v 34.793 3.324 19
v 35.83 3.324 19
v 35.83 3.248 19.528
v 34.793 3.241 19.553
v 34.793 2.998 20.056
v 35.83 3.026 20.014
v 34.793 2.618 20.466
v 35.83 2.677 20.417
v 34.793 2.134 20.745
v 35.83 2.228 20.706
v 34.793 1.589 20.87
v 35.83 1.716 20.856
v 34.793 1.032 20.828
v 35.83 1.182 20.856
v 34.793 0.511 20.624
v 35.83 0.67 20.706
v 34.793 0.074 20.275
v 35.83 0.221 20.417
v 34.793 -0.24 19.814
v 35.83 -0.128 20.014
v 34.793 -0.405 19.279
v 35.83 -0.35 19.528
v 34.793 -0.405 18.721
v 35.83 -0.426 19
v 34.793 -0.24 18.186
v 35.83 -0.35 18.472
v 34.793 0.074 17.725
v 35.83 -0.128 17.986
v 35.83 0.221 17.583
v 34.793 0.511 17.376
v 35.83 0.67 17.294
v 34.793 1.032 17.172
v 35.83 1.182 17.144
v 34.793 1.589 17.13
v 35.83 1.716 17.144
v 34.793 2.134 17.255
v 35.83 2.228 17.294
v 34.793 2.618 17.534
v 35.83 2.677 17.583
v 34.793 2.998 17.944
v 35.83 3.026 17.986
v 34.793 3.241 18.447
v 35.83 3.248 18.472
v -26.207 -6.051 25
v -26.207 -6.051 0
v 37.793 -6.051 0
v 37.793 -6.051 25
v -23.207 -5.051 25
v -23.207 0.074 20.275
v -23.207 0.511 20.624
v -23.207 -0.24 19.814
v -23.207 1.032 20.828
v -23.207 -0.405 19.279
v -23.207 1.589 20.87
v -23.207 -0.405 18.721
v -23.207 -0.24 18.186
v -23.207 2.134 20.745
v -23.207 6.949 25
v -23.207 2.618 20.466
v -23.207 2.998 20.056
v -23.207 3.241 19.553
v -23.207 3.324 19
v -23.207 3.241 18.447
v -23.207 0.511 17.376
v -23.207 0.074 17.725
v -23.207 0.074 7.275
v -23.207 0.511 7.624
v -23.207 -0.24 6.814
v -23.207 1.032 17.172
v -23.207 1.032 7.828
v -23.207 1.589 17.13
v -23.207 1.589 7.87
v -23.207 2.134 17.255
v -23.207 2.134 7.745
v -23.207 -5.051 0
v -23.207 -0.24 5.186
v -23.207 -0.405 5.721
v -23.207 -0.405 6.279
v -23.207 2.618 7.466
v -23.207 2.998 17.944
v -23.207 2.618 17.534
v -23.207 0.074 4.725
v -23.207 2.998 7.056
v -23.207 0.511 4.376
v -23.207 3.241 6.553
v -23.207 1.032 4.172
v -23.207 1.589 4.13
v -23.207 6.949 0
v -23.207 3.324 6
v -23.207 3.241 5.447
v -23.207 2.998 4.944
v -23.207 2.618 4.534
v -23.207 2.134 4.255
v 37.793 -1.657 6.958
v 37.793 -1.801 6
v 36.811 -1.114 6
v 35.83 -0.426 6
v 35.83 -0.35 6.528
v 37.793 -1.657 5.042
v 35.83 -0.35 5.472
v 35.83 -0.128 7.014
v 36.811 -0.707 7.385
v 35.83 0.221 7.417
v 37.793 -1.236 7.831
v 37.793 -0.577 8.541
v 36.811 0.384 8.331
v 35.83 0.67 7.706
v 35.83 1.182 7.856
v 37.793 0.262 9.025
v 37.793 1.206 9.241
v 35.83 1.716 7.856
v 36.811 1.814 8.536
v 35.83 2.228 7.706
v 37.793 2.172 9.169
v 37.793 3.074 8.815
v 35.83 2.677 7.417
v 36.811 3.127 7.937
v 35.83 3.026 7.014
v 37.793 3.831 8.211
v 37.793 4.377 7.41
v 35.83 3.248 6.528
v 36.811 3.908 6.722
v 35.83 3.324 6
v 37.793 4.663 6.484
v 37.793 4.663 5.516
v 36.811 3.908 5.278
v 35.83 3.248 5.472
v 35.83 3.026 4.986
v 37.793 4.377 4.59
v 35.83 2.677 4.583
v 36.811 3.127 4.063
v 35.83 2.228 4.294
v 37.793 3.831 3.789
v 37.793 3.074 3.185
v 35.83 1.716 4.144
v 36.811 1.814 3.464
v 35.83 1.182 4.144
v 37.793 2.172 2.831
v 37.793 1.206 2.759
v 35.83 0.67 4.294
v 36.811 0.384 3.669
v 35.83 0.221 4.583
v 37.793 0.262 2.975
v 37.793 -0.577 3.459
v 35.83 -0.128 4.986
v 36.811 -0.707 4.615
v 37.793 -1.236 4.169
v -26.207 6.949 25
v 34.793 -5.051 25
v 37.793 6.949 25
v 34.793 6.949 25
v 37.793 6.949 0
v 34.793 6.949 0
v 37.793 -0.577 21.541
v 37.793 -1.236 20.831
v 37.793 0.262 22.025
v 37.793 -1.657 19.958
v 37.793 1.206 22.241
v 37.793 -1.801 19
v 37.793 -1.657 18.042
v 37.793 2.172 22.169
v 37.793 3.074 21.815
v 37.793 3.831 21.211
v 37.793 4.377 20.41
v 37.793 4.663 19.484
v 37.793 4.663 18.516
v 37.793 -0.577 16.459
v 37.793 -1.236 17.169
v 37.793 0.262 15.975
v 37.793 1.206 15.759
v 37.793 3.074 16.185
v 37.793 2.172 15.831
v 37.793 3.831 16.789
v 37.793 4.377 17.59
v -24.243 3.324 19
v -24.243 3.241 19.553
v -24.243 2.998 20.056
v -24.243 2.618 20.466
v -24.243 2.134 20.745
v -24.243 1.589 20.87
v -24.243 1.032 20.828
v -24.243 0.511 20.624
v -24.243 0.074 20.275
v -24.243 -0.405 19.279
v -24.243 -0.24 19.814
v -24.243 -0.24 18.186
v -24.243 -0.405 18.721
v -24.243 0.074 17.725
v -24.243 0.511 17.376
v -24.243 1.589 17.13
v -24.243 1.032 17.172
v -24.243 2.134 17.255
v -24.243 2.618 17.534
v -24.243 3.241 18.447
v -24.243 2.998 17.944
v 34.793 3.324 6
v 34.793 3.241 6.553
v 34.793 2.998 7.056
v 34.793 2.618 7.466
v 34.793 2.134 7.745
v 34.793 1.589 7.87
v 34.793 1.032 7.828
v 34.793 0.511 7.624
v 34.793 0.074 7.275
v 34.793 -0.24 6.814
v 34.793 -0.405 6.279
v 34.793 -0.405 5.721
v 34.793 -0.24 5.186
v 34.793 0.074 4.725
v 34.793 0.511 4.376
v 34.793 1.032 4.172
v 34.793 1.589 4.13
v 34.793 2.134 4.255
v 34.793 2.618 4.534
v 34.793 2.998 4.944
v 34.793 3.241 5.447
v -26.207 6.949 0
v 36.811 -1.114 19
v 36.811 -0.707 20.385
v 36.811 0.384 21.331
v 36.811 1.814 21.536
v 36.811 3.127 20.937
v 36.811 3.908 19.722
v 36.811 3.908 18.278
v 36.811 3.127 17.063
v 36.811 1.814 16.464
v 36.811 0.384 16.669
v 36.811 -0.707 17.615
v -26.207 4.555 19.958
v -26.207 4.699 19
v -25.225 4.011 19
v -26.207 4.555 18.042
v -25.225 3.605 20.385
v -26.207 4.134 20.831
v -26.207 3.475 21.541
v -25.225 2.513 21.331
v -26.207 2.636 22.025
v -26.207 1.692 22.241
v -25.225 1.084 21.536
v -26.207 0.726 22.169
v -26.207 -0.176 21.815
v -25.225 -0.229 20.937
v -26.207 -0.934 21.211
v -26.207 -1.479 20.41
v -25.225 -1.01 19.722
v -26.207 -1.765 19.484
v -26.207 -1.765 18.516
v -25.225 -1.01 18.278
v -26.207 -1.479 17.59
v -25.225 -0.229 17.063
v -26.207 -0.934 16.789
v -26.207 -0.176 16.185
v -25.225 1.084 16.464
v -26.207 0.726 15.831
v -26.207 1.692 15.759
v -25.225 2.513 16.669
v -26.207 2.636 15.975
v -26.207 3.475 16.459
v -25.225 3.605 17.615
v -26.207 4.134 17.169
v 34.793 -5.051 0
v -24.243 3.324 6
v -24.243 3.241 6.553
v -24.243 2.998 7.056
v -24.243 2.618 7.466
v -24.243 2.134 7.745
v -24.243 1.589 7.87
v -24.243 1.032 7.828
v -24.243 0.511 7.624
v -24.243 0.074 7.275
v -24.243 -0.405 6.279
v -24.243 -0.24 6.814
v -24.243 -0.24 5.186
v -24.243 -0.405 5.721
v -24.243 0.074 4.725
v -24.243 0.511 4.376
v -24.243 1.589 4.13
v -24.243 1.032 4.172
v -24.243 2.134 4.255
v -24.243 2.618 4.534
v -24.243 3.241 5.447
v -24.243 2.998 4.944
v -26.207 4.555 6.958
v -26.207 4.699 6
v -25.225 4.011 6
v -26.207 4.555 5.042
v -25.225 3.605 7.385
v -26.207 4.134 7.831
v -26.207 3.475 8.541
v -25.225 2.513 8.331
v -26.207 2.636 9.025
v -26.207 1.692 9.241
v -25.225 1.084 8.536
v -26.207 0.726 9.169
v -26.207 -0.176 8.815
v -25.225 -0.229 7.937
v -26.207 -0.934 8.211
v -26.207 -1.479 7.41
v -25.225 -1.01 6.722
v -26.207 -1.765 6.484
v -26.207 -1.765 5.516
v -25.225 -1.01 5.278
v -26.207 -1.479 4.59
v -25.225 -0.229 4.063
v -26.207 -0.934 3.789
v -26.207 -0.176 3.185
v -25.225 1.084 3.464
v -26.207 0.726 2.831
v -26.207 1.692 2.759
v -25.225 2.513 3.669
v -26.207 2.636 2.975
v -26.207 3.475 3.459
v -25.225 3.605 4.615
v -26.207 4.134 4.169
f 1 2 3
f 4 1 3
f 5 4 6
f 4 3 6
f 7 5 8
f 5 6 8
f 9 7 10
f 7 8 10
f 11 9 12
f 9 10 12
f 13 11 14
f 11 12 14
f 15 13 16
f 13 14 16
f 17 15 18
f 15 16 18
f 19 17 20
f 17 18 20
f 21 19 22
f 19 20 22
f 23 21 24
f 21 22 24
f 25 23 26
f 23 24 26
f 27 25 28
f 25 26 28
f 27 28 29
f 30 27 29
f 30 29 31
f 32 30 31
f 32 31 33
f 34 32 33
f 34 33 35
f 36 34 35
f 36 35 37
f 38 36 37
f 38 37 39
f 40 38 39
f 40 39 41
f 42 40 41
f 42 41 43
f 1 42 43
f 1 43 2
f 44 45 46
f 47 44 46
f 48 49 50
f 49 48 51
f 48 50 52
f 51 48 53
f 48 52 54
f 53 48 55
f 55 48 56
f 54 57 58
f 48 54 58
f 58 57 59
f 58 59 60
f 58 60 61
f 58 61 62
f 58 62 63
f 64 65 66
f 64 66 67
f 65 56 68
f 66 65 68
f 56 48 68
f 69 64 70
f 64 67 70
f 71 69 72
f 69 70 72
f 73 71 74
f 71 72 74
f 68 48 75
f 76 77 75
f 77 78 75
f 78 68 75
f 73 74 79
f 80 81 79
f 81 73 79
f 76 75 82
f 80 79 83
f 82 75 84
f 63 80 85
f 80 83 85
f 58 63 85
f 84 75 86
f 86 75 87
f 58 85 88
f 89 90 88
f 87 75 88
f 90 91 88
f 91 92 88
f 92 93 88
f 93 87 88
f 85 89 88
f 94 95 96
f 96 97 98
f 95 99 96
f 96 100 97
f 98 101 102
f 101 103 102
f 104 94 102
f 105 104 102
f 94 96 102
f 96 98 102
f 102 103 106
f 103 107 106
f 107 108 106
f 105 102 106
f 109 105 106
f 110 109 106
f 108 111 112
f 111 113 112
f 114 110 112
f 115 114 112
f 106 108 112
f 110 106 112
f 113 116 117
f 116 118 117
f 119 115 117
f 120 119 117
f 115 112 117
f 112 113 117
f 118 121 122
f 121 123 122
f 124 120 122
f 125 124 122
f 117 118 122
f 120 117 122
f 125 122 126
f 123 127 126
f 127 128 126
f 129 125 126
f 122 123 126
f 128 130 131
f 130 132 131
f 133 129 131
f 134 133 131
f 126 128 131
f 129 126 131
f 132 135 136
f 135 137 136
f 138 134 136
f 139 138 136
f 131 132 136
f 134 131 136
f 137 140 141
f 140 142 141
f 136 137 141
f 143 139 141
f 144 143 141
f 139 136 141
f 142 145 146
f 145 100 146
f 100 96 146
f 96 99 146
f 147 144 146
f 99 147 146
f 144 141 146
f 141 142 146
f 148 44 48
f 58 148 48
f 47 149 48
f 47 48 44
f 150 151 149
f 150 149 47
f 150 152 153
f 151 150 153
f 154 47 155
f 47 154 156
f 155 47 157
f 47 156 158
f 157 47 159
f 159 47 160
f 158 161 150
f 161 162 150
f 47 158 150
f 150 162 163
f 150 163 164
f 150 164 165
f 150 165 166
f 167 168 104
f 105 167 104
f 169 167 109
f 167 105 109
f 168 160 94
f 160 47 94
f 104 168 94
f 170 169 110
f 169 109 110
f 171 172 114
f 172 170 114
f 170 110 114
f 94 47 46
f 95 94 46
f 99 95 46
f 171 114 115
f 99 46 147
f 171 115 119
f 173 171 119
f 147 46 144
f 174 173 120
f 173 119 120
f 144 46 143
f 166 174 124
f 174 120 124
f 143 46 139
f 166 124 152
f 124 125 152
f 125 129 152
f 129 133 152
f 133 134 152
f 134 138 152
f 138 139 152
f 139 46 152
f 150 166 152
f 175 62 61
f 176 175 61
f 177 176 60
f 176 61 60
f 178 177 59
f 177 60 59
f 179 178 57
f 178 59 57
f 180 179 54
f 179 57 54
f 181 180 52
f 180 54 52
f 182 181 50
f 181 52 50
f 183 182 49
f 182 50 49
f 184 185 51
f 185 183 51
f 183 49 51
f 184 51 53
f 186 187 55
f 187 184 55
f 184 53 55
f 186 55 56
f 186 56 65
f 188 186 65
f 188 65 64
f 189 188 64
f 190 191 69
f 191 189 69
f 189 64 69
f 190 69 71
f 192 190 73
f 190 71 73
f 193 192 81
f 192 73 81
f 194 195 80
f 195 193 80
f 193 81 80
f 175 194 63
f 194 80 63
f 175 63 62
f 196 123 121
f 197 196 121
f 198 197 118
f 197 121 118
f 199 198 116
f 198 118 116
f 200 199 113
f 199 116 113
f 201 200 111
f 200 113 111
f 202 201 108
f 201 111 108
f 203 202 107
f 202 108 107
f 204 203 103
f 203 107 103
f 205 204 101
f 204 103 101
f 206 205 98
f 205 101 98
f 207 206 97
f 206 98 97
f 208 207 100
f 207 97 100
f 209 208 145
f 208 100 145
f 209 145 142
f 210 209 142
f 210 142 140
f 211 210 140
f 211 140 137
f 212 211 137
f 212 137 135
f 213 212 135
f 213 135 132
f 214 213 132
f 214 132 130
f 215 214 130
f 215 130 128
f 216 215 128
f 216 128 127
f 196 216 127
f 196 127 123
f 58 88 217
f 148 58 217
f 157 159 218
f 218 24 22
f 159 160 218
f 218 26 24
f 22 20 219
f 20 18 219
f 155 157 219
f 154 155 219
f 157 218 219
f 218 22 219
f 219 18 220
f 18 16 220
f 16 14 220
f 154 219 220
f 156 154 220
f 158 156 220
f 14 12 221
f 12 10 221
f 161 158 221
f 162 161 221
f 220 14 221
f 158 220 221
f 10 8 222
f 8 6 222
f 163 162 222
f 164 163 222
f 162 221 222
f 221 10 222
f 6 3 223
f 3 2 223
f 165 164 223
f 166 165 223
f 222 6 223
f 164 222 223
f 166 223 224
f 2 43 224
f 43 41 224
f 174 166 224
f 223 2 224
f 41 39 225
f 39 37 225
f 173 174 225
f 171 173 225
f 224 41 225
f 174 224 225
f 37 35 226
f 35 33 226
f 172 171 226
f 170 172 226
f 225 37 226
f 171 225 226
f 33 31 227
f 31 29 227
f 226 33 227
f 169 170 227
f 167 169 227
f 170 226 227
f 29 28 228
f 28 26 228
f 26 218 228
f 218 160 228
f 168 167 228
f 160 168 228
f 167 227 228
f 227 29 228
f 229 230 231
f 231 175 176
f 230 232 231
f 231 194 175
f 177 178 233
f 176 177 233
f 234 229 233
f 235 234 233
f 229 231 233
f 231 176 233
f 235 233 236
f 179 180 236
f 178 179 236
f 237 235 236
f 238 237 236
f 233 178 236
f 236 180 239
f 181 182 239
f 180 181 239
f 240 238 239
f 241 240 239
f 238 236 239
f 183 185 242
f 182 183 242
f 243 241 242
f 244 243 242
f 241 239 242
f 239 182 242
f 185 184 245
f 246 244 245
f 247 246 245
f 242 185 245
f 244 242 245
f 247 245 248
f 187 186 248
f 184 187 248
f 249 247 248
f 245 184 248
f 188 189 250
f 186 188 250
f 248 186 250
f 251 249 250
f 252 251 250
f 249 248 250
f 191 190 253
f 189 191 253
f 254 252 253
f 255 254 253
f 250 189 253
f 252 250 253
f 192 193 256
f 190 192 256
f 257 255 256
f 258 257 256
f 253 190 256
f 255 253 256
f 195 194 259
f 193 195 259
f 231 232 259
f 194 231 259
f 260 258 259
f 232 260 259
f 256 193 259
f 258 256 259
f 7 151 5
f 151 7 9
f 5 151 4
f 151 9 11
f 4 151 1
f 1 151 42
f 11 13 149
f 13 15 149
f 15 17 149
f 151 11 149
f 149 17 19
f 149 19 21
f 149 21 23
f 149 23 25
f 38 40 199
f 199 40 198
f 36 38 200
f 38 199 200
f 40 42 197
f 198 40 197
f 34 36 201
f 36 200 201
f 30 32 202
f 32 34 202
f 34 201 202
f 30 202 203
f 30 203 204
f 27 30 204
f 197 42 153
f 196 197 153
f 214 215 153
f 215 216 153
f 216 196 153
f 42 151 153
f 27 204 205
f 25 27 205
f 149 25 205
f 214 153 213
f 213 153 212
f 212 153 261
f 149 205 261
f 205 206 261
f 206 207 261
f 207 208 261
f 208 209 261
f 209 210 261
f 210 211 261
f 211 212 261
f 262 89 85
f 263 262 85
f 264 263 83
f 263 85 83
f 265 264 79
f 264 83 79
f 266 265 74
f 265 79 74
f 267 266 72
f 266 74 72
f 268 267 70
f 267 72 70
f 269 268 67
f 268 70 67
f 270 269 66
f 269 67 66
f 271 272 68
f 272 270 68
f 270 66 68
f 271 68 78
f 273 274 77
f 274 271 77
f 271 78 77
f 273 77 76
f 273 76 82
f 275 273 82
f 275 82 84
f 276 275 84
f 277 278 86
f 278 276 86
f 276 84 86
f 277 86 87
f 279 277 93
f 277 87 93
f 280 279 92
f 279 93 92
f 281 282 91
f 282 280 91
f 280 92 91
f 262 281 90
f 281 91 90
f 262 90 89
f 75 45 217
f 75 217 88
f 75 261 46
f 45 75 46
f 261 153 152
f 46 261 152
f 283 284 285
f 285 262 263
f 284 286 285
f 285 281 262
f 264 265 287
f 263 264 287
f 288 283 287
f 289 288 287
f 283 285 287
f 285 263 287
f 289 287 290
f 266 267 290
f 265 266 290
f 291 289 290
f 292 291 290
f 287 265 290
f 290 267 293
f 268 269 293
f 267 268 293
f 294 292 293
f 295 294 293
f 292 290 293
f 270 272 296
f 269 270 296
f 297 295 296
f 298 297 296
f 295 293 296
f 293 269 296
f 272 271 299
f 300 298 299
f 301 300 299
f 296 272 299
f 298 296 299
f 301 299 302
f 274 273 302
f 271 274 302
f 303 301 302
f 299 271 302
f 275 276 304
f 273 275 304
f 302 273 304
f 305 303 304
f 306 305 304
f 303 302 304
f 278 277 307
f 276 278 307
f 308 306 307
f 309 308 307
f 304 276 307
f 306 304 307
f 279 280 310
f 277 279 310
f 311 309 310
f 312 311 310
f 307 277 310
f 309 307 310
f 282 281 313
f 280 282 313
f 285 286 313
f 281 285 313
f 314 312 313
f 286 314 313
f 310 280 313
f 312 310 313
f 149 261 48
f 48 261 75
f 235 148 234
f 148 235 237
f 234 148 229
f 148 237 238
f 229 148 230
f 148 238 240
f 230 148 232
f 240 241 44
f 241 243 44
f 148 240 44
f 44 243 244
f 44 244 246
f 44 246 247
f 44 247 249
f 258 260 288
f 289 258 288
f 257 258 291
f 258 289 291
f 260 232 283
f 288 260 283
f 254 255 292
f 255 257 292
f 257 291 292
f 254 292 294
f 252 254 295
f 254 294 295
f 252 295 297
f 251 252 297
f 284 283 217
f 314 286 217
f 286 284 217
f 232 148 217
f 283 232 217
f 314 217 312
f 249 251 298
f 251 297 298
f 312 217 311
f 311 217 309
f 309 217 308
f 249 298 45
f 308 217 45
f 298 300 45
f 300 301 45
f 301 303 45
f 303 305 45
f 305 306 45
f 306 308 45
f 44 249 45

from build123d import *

# Parameters (mm, degrees)
F1_DEPTH       = 25
F4_D           = 3.75
F4_CSINK_D     = 6.5
F4_CSINK_ANGLE = 70
F5_D           = 3.75
F5_CSINK_D     = 6.5
F5_CSINK_ANGLE = 70


with BuildPart() as f1:
    # F0 (on Top) → F1 (new body)
    with BuildSketch(Plane.XY):
        Polygon((-23.20677, 6.948909), (-26.20677, 6.948909), (-26.20677, -6.051091), (37.79323, -6.051091), (37.79323, 6.948909), (34.79323, 6.948909), (34.79323, -5.051091), (-23.20677, -5.051091), align=None)
    extrude(amount=F1_DEPTH)

    # F4 (through all)
    with Locations(Plane(origin=(-26.20677, 0, 0), x_dir=(0, -1, 0), z_dir=(-1, 0, 0))):
        with Locations((-1.448909, 6), (-1.448909, 19)):
            CounterSinkHole(F4_D / 2, F4_CSINK_D / 2, counter_sink_angle=F4_CSINK_ANGLE)

    # F5 (through all)
    with Locations(Plane.YZ.offset(37.79323)):
        with Locations((1.448909, 19), (1.448909, 6)):
            CounterSinkHole(F5_D / 2, F5_CSINK_D / 2, counter_sink_angle=F5_CSINK_ANGLE)


solid = f1.part
